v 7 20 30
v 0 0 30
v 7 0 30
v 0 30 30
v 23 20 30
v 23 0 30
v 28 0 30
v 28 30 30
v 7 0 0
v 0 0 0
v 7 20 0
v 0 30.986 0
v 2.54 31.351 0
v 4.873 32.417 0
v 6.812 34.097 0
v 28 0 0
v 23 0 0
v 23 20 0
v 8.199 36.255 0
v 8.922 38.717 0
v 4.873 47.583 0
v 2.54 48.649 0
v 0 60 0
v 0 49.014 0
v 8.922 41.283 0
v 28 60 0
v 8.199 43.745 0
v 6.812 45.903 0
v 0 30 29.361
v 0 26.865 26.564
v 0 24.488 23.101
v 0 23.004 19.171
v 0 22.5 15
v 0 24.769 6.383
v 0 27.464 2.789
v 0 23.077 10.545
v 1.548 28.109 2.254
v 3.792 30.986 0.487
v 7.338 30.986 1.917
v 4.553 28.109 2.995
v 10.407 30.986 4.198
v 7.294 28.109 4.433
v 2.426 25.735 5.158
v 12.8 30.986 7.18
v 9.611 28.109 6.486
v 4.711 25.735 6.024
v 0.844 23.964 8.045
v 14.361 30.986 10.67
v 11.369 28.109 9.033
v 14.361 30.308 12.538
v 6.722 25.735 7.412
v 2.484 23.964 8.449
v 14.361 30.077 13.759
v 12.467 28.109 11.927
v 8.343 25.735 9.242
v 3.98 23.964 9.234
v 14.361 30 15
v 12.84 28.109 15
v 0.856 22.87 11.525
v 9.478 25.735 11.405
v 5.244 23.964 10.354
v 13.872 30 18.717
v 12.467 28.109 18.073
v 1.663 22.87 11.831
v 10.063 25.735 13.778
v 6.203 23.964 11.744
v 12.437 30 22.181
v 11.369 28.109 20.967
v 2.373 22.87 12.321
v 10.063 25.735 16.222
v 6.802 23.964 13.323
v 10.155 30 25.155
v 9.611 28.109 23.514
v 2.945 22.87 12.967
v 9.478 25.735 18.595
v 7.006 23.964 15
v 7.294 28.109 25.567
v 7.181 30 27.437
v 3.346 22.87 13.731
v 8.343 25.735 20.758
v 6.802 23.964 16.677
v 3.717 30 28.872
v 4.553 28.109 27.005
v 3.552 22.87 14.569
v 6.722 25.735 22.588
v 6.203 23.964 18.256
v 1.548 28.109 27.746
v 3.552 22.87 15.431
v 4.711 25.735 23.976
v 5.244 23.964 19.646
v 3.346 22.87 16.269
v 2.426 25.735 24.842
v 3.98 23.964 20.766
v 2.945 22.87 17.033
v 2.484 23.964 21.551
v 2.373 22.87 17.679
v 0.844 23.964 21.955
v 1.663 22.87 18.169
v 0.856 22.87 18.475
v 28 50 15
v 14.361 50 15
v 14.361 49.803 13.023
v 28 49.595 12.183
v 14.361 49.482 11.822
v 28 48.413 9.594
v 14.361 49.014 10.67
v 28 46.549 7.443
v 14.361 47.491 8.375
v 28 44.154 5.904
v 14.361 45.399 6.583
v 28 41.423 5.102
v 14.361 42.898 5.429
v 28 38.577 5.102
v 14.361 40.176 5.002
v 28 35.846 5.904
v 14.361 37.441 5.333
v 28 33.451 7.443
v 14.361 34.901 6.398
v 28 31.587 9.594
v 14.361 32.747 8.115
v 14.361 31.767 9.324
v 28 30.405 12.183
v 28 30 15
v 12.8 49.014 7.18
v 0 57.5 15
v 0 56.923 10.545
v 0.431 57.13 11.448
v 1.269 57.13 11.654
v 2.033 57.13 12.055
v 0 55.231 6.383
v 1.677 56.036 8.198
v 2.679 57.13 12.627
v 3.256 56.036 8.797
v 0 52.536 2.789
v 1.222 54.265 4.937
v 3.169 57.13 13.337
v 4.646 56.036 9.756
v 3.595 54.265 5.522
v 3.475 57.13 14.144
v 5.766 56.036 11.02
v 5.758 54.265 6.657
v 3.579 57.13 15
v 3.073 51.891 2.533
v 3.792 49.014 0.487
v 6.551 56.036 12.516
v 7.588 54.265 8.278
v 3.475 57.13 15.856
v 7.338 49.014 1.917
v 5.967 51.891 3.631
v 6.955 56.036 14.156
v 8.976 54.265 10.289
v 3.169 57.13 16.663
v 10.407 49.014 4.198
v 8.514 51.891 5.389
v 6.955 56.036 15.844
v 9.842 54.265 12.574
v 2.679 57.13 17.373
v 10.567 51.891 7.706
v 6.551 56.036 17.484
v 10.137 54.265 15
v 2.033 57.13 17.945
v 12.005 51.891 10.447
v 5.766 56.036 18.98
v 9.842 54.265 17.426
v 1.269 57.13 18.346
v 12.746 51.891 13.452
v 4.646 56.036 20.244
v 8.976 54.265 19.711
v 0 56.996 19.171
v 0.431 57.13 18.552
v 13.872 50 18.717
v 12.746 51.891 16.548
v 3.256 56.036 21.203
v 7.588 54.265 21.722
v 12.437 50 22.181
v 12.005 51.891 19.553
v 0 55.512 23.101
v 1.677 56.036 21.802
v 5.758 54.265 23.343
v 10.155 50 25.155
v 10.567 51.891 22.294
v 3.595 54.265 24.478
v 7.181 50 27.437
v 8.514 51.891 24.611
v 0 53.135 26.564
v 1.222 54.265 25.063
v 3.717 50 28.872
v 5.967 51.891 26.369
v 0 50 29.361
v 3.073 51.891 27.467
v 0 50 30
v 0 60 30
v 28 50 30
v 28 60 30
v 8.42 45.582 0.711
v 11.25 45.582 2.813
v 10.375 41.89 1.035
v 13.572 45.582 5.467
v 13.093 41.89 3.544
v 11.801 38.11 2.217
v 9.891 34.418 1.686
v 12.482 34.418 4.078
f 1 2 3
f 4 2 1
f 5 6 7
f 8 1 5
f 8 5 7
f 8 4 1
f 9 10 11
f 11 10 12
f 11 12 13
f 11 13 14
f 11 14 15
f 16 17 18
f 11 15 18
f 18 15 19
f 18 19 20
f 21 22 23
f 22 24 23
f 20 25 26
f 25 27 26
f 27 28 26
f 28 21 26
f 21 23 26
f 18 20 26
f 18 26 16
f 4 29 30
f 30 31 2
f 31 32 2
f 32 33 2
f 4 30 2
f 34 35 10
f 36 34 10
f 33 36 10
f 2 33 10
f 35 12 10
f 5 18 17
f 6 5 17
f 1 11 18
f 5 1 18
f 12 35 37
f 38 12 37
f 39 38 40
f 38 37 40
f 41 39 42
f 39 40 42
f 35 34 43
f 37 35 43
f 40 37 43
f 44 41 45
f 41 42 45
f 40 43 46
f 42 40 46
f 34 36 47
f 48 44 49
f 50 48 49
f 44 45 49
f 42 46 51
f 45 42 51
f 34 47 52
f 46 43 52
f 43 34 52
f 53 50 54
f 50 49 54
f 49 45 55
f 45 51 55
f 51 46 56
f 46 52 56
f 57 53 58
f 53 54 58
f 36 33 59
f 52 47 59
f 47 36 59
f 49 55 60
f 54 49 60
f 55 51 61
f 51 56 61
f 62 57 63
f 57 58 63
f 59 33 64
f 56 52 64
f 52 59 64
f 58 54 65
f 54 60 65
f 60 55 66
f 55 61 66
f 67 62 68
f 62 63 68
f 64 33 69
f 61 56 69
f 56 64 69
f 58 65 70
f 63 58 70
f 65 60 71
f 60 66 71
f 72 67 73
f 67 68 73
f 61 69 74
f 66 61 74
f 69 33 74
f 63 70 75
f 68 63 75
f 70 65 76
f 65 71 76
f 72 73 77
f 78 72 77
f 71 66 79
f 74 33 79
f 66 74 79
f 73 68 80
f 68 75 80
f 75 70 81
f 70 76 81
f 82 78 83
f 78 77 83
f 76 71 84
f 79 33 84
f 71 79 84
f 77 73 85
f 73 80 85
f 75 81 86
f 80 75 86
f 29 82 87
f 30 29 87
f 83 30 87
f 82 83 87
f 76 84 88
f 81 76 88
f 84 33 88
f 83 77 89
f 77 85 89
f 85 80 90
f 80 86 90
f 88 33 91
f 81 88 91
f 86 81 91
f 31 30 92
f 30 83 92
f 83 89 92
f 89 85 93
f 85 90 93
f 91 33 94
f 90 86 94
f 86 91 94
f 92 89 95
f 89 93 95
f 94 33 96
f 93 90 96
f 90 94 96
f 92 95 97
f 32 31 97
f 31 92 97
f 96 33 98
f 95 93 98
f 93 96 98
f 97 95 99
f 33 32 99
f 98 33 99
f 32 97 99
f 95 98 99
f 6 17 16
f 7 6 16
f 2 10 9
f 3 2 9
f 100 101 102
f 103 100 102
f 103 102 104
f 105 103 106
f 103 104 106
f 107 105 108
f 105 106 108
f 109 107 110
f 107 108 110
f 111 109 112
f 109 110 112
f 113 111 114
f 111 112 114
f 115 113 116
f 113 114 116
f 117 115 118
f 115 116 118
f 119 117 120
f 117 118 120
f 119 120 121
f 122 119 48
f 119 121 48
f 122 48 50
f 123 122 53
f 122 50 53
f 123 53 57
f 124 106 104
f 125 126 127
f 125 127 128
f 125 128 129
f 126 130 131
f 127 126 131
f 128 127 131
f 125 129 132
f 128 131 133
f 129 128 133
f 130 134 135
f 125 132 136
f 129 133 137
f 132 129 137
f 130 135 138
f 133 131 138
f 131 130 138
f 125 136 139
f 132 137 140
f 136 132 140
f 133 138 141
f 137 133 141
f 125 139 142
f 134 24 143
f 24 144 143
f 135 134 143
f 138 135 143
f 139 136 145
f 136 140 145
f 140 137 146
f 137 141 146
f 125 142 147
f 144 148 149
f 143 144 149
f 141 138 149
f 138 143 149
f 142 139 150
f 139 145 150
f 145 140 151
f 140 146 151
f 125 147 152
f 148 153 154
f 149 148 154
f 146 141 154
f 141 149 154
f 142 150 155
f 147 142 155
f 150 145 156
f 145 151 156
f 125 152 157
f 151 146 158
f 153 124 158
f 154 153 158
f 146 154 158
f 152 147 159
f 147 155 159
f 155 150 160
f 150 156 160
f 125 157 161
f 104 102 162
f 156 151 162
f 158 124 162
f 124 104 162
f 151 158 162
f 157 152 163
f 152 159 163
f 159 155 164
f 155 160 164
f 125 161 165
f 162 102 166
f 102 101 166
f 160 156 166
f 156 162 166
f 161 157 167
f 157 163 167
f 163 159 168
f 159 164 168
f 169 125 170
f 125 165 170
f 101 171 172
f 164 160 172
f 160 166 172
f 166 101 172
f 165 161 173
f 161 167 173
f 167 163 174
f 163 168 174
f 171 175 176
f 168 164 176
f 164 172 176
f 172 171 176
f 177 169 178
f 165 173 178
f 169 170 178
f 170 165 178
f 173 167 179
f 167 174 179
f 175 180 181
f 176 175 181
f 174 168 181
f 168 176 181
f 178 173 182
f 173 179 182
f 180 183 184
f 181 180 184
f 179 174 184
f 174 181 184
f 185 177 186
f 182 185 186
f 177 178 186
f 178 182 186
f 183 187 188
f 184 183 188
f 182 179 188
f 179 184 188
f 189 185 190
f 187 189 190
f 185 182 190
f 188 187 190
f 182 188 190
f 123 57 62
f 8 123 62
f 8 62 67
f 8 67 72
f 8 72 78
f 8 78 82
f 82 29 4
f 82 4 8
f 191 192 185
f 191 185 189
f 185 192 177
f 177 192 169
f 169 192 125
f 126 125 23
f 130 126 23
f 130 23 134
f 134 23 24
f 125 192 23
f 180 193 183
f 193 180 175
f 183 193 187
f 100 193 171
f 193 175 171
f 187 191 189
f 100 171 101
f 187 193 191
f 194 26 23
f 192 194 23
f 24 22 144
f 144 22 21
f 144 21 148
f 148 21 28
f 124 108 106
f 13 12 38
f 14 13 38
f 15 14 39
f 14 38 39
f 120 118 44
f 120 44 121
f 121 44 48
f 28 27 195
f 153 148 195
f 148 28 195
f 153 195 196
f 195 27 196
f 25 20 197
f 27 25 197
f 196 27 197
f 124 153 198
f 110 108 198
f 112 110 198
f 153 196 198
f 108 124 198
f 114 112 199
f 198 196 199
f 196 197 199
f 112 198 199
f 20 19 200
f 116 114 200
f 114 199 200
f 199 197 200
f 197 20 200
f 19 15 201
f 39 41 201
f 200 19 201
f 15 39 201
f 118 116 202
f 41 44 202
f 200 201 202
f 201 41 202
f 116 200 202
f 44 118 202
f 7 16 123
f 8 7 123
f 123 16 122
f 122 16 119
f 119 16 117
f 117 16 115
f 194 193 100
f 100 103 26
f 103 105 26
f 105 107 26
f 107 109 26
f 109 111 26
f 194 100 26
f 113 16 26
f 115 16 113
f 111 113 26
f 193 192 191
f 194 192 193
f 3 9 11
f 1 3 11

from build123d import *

# Parameters (mm, degrees)
F1_DEPTH = 30
F3_DEPTH = 28


with BuildPart() as f1:
    # F0 (on Top) → F1 (new body)
    with BuildSketch(Plane.XY):
        Polygon((0, 60), (0, 0), (7, 0), (7, 20), (23, 20), (23, 0), (28, 0), (28, 60), align=None)
    extrude(amount=F1_DEPTH)

    # F2 (on face) → F3 (cut, through all)
    with BuildSketch(Plane(origin=(0, 0, 0), x_dir=(0, -1, 0), z_dir=(-1, 0, 0))):
        with BuildLine():
            ThreePointArc((-50, 15), (-40, 5), (-30, 15))
            Line((-30, 15), (-50, 15))
        make_face()
        with BuildLine():
            Line((-50, 15), (-30, 15))
            ThreePointArc((-30, 15), (-40, 25), (-50, 15))
        make_face()
        with BuildLine():
            Line((-30, 15), (-30, 30))
            Line((-30, 30), (-50, 30))
            Line((-50, 30), (-50, 15))
            ThreePointArc((-50, 15), (-40, 25), (-30, 15))
        make_face()
    extrude(amount=-F3_DEPTH, mode=Mode.SUBTRACT)

    # F2 (on face) → F4 (revolve, cut)
    with BuildSketch(Plane(origin=(0, 0, 0), x_dir=(0, -1, 0), z_dir=(-1, 0, 0))):
        with BuildLine():
            ThreePointArc((-50, 15), (-40, 5), (-30, 15))
            Line((-30, 15), (-50, 15))
        make_face()
        with BuildLine():
            Line((-49.0138781887, 0), (-30.9861218113, 0))
            ThreePointArc((-30.9861218113, 0), (-24.7685708435, 6.3829491211), (-22.5, 15))
            Line((-22.5, 15), (-30, 15))
            ThreePointArc((-30, 15), (-40, 5), (-50, 15))
            Line((-50, 15), (-57.5, 15))
            ThreePointArc((-57.5, 15), (-55.2314291565, 6.3829491211), (-49.0138781887, 0))
        make_face()
        with BuildLine():
            ThreePointArc((-49.0138781887, 0), (-40, -2.5), (-30.9861218113, 0))
            Line((-30.9861218113, 0), (-49.0138781887, 0))
        make_face()
    revolve(axis=Axis((0, 40, 15), (0, -1, 0)), mode=Mode.SUBTRACT)


solid = f1.part
